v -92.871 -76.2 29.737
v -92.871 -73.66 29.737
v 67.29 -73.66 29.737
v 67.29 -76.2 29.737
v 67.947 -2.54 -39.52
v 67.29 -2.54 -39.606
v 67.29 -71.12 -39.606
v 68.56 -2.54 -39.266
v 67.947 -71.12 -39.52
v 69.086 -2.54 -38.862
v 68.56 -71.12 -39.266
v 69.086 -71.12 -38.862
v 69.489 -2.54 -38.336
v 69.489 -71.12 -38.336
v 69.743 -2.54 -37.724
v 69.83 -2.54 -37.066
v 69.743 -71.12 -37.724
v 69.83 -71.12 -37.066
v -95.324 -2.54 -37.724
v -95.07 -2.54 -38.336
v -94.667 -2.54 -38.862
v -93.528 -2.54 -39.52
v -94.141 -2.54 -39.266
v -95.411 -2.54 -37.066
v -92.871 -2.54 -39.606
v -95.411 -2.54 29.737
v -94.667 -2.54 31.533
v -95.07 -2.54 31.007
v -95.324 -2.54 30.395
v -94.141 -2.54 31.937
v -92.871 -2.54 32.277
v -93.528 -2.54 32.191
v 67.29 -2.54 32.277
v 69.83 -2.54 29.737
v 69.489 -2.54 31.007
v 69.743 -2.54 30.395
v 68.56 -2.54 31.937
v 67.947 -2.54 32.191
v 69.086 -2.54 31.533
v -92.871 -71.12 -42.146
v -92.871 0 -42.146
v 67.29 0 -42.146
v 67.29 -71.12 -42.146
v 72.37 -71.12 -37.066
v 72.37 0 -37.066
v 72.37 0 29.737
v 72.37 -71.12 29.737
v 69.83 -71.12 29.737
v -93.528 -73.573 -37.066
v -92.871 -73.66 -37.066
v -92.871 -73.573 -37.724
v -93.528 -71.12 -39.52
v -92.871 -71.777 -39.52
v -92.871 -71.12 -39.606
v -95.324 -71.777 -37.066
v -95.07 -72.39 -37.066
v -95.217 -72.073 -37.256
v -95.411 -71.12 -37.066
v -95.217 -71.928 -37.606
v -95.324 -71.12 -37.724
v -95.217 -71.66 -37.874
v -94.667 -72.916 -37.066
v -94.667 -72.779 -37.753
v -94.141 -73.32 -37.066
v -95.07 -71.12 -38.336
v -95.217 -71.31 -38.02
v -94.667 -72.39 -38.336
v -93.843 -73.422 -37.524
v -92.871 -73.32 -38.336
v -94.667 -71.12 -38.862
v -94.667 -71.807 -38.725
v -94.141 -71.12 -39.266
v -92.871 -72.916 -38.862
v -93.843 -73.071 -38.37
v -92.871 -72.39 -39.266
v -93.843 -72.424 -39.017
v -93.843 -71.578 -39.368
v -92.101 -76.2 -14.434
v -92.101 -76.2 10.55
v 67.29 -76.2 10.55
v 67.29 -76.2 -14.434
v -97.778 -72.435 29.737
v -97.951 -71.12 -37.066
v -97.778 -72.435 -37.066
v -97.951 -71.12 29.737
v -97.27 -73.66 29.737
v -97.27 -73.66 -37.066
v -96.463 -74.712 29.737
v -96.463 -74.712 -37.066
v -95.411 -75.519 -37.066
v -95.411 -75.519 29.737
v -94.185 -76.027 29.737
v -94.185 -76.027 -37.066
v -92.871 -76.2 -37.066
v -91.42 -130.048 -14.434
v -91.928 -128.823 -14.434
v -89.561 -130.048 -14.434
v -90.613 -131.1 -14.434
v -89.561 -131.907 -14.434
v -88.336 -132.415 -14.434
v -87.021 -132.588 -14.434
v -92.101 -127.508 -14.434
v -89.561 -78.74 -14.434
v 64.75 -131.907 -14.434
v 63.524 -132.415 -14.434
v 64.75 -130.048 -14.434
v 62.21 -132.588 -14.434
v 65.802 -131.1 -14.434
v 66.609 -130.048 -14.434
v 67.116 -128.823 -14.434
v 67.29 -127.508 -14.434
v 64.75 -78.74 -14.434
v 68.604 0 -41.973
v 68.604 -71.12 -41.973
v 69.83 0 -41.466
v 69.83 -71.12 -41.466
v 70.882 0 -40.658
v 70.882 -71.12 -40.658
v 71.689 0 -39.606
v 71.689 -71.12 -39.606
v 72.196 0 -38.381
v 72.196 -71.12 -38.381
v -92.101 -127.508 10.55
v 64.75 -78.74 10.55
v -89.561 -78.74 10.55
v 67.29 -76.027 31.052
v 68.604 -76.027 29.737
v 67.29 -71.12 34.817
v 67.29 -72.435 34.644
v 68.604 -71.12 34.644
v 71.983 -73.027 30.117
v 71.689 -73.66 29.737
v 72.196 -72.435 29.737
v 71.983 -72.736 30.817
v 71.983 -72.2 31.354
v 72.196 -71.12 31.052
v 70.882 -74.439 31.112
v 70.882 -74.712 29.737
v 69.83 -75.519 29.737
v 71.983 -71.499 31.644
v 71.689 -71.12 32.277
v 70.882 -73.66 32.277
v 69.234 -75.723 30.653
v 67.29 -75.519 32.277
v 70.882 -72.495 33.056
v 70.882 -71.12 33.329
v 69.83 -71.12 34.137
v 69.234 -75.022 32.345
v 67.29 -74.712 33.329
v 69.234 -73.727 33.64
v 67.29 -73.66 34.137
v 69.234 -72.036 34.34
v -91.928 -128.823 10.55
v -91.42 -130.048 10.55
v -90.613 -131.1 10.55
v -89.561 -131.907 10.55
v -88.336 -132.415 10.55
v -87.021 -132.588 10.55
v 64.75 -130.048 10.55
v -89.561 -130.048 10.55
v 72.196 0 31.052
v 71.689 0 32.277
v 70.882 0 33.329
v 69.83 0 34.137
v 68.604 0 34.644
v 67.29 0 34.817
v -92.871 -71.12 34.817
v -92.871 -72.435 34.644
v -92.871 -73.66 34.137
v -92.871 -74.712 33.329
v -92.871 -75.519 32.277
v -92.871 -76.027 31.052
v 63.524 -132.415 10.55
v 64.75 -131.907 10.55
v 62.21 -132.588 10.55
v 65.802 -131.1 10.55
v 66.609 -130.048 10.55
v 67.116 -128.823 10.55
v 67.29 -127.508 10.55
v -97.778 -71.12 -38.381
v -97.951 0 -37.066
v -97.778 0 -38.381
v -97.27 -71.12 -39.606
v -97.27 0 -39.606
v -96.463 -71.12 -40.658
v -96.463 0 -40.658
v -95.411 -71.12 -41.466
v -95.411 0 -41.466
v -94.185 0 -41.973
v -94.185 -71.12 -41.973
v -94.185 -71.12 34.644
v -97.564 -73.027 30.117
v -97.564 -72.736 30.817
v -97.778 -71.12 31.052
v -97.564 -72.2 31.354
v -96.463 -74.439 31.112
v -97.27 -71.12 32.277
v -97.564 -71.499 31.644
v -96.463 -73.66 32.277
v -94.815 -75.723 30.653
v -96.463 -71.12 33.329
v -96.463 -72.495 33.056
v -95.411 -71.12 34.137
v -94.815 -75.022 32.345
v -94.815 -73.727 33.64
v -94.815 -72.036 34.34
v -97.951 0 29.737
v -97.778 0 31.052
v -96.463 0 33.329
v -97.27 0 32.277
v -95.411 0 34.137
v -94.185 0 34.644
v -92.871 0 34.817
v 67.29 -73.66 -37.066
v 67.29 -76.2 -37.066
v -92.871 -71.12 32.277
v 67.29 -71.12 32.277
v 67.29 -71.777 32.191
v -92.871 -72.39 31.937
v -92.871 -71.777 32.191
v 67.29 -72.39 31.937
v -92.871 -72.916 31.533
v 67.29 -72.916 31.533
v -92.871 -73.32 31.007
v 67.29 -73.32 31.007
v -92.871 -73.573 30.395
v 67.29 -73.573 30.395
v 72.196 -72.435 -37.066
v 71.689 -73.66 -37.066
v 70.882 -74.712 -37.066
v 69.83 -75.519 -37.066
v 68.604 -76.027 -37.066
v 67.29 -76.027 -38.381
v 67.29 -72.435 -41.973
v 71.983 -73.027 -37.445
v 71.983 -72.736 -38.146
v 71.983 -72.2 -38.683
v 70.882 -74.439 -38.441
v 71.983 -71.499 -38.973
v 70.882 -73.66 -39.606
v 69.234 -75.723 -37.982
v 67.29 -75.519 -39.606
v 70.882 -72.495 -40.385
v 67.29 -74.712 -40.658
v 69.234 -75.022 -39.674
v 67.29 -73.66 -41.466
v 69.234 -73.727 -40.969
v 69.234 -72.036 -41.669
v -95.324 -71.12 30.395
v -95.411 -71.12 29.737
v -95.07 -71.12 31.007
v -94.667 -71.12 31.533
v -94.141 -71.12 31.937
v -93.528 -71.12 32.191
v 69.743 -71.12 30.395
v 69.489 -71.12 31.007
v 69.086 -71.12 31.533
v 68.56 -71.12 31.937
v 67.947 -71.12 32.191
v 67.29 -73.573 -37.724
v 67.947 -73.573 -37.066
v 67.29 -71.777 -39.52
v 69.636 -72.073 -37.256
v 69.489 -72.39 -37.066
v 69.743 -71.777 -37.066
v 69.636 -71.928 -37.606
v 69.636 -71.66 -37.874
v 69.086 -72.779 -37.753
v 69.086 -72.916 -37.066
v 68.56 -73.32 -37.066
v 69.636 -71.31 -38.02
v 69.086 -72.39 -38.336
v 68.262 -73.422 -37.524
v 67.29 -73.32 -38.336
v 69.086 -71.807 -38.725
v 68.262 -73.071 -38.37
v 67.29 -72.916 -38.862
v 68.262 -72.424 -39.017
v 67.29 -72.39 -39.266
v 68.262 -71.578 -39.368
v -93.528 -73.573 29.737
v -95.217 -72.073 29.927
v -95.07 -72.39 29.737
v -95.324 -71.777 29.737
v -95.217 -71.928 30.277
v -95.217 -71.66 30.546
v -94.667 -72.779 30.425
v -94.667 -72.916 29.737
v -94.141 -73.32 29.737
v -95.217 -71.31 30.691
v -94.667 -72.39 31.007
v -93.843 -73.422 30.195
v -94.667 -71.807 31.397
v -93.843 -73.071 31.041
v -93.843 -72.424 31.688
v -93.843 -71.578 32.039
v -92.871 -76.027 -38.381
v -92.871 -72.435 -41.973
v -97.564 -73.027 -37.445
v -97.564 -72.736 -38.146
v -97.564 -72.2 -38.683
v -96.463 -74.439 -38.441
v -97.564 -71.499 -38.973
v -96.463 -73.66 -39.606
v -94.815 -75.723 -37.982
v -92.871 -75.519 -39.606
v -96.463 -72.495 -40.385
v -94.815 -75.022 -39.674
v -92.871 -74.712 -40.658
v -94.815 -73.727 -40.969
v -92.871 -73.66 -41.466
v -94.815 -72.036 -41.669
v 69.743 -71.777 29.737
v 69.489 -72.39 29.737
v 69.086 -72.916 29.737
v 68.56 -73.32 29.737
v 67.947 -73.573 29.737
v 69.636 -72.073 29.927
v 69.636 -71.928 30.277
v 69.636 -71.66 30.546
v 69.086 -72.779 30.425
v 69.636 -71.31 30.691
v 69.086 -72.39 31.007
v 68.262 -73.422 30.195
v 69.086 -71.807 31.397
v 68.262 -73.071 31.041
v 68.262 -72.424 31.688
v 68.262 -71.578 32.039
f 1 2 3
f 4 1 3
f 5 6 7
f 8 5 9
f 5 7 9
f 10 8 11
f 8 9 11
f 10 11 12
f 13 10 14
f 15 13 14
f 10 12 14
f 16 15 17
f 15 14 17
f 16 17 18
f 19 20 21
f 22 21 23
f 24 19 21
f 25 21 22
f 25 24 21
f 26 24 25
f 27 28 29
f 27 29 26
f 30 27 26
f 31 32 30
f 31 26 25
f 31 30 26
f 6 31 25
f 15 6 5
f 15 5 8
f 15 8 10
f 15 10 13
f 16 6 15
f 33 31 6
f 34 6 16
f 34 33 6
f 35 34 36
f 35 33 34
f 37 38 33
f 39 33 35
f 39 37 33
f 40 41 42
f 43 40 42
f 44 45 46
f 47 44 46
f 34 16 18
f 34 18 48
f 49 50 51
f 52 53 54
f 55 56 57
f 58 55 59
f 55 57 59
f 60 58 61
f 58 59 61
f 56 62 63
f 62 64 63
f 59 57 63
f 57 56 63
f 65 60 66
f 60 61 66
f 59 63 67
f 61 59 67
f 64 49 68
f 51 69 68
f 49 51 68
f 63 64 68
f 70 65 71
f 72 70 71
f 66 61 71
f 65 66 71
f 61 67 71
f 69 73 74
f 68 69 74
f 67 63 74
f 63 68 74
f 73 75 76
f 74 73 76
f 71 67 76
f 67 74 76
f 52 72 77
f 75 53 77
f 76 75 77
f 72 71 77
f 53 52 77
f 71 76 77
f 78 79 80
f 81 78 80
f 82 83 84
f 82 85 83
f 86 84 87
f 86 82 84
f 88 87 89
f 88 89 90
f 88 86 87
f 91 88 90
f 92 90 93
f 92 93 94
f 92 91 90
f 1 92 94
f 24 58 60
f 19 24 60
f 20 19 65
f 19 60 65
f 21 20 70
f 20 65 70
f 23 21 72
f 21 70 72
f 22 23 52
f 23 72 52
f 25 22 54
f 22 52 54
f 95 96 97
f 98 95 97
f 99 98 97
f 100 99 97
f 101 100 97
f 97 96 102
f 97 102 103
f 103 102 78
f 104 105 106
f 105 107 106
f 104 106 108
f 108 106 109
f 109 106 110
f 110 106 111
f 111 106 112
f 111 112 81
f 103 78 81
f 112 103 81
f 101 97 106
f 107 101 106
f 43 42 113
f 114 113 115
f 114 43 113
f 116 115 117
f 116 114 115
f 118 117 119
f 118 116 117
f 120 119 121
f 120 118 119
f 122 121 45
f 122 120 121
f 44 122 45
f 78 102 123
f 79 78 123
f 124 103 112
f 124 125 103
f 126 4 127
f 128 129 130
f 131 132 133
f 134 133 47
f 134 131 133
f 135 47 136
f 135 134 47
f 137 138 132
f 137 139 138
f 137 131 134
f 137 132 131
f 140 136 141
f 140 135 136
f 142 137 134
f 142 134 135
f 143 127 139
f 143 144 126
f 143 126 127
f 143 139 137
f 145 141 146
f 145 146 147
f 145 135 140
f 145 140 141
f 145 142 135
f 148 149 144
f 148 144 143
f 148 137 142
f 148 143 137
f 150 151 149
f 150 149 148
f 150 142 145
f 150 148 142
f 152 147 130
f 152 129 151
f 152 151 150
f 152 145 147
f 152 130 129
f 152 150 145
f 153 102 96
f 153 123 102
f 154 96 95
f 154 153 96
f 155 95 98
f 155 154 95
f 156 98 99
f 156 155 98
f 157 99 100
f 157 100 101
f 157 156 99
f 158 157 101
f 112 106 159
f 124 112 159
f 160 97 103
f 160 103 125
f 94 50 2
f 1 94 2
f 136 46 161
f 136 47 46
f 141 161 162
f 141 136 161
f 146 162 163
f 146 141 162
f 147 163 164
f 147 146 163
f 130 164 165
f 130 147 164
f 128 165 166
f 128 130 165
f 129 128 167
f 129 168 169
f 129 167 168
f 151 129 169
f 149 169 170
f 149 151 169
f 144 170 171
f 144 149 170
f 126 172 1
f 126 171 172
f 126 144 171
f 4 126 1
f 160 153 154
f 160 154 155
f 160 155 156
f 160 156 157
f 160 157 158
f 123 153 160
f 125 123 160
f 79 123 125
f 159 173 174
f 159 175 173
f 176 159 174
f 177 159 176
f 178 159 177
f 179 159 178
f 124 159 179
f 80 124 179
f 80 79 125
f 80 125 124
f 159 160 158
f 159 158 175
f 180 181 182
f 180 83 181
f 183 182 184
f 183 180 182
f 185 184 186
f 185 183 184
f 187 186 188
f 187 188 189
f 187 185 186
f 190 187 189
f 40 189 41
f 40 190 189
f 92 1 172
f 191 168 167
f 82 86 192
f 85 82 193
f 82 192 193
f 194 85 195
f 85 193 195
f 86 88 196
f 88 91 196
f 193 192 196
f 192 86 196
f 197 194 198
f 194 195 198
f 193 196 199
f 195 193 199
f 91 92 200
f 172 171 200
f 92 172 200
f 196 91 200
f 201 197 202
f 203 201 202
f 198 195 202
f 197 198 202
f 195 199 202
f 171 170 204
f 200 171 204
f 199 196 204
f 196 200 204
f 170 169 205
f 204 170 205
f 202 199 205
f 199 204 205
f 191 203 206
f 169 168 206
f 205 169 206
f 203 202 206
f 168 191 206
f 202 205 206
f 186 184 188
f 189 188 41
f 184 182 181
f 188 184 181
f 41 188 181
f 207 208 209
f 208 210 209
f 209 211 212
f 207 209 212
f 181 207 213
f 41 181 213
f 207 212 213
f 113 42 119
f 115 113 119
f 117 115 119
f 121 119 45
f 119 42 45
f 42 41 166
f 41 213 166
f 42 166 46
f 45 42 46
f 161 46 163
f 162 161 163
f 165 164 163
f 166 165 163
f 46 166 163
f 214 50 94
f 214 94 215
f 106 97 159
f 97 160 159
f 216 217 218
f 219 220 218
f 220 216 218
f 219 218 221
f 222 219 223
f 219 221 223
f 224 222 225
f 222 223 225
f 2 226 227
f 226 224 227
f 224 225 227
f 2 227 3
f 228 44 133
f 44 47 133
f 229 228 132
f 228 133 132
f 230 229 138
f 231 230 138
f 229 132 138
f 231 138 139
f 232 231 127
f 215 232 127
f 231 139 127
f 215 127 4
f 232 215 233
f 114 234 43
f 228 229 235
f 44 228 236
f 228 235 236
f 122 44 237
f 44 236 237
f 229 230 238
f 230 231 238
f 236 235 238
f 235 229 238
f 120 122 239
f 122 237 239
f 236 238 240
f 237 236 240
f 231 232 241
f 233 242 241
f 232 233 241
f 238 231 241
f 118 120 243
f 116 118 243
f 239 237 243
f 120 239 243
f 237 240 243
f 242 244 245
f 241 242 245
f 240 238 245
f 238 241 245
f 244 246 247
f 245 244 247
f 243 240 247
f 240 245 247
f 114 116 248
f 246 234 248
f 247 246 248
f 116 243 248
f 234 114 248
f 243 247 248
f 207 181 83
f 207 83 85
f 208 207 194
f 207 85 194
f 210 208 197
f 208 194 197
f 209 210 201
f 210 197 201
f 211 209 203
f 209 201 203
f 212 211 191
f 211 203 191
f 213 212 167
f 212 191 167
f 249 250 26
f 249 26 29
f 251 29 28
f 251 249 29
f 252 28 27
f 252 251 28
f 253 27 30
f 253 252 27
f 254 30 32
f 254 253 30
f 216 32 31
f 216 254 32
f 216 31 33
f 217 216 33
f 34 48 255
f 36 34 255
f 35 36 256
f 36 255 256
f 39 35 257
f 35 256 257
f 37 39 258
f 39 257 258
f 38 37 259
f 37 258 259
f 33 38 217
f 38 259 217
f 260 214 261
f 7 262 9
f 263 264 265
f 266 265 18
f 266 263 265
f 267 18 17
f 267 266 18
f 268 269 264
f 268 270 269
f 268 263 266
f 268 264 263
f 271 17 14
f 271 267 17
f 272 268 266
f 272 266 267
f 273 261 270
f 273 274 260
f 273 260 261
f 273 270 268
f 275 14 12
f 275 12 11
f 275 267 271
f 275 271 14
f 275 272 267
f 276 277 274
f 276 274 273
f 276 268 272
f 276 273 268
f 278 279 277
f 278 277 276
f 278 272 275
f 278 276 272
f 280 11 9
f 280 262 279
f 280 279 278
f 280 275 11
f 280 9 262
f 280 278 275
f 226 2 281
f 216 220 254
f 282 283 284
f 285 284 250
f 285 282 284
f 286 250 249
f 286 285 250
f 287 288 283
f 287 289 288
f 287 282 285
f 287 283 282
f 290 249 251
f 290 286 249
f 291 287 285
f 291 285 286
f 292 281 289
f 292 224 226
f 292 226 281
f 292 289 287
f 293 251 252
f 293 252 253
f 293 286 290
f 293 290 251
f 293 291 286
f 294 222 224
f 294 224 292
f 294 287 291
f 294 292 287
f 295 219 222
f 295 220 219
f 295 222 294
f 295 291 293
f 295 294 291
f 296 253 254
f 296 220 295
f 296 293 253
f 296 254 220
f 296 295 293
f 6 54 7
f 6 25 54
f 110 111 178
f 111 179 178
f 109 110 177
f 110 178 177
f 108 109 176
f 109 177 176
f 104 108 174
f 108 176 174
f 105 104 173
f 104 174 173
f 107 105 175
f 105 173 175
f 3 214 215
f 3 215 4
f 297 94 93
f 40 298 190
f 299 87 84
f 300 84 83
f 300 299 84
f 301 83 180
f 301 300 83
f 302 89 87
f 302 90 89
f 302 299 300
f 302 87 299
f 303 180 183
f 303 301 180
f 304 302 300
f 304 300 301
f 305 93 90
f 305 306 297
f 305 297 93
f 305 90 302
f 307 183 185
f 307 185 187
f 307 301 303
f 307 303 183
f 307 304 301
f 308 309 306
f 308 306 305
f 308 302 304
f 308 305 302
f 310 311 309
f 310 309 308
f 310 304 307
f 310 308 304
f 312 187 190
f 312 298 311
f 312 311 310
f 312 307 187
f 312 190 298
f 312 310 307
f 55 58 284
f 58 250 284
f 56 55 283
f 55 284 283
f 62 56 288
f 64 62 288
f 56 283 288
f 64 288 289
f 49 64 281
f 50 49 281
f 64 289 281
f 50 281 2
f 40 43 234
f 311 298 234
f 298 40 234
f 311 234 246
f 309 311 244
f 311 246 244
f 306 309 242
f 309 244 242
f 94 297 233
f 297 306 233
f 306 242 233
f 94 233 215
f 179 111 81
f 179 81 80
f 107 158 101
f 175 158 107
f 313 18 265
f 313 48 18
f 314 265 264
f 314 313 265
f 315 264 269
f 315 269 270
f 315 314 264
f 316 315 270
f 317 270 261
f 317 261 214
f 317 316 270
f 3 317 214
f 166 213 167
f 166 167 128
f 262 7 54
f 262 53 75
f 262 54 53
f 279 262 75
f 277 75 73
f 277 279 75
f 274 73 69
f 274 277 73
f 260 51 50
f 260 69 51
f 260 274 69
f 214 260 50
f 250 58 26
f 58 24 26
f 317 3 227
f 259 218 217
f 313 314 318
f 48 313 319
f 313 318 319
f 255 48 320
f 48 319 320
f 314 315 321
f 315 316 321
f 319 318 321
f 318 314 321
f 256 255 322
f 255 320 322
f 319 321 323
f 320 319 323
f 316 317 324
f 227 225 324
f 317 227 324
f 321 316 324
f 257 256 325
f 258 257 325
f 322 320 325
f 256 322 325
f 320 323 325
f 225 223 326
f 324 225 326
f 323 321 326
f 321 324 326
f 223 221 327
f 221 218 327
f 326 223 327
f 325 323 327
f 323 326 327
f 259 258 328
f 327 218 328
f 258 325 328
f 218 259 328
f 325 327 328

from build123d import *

# Parameters (mm, degrees)
F0_W     = 170.3201010823
F0_H     = 76.9634731114
F1_DEPTH = 76.2
F2_R     = 5.08
F4_T     = -2.54
F5_W     = 159.3903745842
F5_H     = 24.9838475138
F6_DEPTH = 56.388
F7_T     = -2.54
F8_R     = 5.08


# Not quite as in the source:
# - a shell that OpenCascade refuses in one call is made with other operations: the cavity is built on its own and cut out


with BuildPart() as f1:
    # F0 (on Front) → F1 (new body)
    with BuildSketch(Plane.XZ):
        with Locations((-12.7905495465, -3.6644246429)):
            Rectangle(F0_W, F0_H)
    extrude(amount=F1_DEPTH)

    # F2
    f2_edges = [f1.edges().sort_by_distance(p)[0] for p in [
        (-12.79055, -76.2, 34.817312),
        (-12.79055, -76.2, -42.146161),
        (-97.9506, -76.2, -3.664425),
        (72.369501, -76.2, -3.664425),
        (72.369501, -38.1, -42.146161),
        (72.369501, -38.1, 34.817312),
        (-97.9506, -38.1, 34.817312),
        (-97.9506, -38.1, -42.146161),
    ]]
    fillet(f2_edges, radius=F2_R)

    # F4: a shell. OpenCascade refuses it in one call, so the cavity is built on its own and cut out:
    # the body offset inwards by the wall thickness, plus a prism from it out through each open face.
    f4_core = offset(f1.part, amount=F4_T, mode=Mode.PRIVATE)
    f4_exits = [f4_core.faces().sort_by_distance(p)[0] for p in [
        (-12.79055, -73.66, -3.664425),
    ]]
    add(f4_core, mode=Mode.SUBTRACT)
    extrude(f4_exits, amount=-F4_T, mode=Mode.SUBTRACT)


with BuildPart() as f6:
    # F5 (on face) → F6 (new body)
    with BuildSketch(Plane.XZ.offset(76.2)):
        with Locations((-12.4056862974, -1.9419882447)):
            Rectangle(F5_W, F5_H)
    extrude(amount=F6_DEPTH)

    # F7
    f7_openings = [f6.faces().sort_by_distance(p)[0] for p in [
        (-12.405686, -104.394, 10.549936),
        (-12.405686, -104.394, -14.433912),
    ]]
    offset(amount=F7_T, openings=f7_openings)

    # F8
    f8_edges = [f6.edges().sort_by_distance(p)[0] for p in [
        (-92.100874, -132.588, -1.941988),
        (67.289501, -132.588, -1.941988),
    ]]
    fillet(f8_edges, radius=F8_R)


solid = Compound([f1.part, f6.part])
